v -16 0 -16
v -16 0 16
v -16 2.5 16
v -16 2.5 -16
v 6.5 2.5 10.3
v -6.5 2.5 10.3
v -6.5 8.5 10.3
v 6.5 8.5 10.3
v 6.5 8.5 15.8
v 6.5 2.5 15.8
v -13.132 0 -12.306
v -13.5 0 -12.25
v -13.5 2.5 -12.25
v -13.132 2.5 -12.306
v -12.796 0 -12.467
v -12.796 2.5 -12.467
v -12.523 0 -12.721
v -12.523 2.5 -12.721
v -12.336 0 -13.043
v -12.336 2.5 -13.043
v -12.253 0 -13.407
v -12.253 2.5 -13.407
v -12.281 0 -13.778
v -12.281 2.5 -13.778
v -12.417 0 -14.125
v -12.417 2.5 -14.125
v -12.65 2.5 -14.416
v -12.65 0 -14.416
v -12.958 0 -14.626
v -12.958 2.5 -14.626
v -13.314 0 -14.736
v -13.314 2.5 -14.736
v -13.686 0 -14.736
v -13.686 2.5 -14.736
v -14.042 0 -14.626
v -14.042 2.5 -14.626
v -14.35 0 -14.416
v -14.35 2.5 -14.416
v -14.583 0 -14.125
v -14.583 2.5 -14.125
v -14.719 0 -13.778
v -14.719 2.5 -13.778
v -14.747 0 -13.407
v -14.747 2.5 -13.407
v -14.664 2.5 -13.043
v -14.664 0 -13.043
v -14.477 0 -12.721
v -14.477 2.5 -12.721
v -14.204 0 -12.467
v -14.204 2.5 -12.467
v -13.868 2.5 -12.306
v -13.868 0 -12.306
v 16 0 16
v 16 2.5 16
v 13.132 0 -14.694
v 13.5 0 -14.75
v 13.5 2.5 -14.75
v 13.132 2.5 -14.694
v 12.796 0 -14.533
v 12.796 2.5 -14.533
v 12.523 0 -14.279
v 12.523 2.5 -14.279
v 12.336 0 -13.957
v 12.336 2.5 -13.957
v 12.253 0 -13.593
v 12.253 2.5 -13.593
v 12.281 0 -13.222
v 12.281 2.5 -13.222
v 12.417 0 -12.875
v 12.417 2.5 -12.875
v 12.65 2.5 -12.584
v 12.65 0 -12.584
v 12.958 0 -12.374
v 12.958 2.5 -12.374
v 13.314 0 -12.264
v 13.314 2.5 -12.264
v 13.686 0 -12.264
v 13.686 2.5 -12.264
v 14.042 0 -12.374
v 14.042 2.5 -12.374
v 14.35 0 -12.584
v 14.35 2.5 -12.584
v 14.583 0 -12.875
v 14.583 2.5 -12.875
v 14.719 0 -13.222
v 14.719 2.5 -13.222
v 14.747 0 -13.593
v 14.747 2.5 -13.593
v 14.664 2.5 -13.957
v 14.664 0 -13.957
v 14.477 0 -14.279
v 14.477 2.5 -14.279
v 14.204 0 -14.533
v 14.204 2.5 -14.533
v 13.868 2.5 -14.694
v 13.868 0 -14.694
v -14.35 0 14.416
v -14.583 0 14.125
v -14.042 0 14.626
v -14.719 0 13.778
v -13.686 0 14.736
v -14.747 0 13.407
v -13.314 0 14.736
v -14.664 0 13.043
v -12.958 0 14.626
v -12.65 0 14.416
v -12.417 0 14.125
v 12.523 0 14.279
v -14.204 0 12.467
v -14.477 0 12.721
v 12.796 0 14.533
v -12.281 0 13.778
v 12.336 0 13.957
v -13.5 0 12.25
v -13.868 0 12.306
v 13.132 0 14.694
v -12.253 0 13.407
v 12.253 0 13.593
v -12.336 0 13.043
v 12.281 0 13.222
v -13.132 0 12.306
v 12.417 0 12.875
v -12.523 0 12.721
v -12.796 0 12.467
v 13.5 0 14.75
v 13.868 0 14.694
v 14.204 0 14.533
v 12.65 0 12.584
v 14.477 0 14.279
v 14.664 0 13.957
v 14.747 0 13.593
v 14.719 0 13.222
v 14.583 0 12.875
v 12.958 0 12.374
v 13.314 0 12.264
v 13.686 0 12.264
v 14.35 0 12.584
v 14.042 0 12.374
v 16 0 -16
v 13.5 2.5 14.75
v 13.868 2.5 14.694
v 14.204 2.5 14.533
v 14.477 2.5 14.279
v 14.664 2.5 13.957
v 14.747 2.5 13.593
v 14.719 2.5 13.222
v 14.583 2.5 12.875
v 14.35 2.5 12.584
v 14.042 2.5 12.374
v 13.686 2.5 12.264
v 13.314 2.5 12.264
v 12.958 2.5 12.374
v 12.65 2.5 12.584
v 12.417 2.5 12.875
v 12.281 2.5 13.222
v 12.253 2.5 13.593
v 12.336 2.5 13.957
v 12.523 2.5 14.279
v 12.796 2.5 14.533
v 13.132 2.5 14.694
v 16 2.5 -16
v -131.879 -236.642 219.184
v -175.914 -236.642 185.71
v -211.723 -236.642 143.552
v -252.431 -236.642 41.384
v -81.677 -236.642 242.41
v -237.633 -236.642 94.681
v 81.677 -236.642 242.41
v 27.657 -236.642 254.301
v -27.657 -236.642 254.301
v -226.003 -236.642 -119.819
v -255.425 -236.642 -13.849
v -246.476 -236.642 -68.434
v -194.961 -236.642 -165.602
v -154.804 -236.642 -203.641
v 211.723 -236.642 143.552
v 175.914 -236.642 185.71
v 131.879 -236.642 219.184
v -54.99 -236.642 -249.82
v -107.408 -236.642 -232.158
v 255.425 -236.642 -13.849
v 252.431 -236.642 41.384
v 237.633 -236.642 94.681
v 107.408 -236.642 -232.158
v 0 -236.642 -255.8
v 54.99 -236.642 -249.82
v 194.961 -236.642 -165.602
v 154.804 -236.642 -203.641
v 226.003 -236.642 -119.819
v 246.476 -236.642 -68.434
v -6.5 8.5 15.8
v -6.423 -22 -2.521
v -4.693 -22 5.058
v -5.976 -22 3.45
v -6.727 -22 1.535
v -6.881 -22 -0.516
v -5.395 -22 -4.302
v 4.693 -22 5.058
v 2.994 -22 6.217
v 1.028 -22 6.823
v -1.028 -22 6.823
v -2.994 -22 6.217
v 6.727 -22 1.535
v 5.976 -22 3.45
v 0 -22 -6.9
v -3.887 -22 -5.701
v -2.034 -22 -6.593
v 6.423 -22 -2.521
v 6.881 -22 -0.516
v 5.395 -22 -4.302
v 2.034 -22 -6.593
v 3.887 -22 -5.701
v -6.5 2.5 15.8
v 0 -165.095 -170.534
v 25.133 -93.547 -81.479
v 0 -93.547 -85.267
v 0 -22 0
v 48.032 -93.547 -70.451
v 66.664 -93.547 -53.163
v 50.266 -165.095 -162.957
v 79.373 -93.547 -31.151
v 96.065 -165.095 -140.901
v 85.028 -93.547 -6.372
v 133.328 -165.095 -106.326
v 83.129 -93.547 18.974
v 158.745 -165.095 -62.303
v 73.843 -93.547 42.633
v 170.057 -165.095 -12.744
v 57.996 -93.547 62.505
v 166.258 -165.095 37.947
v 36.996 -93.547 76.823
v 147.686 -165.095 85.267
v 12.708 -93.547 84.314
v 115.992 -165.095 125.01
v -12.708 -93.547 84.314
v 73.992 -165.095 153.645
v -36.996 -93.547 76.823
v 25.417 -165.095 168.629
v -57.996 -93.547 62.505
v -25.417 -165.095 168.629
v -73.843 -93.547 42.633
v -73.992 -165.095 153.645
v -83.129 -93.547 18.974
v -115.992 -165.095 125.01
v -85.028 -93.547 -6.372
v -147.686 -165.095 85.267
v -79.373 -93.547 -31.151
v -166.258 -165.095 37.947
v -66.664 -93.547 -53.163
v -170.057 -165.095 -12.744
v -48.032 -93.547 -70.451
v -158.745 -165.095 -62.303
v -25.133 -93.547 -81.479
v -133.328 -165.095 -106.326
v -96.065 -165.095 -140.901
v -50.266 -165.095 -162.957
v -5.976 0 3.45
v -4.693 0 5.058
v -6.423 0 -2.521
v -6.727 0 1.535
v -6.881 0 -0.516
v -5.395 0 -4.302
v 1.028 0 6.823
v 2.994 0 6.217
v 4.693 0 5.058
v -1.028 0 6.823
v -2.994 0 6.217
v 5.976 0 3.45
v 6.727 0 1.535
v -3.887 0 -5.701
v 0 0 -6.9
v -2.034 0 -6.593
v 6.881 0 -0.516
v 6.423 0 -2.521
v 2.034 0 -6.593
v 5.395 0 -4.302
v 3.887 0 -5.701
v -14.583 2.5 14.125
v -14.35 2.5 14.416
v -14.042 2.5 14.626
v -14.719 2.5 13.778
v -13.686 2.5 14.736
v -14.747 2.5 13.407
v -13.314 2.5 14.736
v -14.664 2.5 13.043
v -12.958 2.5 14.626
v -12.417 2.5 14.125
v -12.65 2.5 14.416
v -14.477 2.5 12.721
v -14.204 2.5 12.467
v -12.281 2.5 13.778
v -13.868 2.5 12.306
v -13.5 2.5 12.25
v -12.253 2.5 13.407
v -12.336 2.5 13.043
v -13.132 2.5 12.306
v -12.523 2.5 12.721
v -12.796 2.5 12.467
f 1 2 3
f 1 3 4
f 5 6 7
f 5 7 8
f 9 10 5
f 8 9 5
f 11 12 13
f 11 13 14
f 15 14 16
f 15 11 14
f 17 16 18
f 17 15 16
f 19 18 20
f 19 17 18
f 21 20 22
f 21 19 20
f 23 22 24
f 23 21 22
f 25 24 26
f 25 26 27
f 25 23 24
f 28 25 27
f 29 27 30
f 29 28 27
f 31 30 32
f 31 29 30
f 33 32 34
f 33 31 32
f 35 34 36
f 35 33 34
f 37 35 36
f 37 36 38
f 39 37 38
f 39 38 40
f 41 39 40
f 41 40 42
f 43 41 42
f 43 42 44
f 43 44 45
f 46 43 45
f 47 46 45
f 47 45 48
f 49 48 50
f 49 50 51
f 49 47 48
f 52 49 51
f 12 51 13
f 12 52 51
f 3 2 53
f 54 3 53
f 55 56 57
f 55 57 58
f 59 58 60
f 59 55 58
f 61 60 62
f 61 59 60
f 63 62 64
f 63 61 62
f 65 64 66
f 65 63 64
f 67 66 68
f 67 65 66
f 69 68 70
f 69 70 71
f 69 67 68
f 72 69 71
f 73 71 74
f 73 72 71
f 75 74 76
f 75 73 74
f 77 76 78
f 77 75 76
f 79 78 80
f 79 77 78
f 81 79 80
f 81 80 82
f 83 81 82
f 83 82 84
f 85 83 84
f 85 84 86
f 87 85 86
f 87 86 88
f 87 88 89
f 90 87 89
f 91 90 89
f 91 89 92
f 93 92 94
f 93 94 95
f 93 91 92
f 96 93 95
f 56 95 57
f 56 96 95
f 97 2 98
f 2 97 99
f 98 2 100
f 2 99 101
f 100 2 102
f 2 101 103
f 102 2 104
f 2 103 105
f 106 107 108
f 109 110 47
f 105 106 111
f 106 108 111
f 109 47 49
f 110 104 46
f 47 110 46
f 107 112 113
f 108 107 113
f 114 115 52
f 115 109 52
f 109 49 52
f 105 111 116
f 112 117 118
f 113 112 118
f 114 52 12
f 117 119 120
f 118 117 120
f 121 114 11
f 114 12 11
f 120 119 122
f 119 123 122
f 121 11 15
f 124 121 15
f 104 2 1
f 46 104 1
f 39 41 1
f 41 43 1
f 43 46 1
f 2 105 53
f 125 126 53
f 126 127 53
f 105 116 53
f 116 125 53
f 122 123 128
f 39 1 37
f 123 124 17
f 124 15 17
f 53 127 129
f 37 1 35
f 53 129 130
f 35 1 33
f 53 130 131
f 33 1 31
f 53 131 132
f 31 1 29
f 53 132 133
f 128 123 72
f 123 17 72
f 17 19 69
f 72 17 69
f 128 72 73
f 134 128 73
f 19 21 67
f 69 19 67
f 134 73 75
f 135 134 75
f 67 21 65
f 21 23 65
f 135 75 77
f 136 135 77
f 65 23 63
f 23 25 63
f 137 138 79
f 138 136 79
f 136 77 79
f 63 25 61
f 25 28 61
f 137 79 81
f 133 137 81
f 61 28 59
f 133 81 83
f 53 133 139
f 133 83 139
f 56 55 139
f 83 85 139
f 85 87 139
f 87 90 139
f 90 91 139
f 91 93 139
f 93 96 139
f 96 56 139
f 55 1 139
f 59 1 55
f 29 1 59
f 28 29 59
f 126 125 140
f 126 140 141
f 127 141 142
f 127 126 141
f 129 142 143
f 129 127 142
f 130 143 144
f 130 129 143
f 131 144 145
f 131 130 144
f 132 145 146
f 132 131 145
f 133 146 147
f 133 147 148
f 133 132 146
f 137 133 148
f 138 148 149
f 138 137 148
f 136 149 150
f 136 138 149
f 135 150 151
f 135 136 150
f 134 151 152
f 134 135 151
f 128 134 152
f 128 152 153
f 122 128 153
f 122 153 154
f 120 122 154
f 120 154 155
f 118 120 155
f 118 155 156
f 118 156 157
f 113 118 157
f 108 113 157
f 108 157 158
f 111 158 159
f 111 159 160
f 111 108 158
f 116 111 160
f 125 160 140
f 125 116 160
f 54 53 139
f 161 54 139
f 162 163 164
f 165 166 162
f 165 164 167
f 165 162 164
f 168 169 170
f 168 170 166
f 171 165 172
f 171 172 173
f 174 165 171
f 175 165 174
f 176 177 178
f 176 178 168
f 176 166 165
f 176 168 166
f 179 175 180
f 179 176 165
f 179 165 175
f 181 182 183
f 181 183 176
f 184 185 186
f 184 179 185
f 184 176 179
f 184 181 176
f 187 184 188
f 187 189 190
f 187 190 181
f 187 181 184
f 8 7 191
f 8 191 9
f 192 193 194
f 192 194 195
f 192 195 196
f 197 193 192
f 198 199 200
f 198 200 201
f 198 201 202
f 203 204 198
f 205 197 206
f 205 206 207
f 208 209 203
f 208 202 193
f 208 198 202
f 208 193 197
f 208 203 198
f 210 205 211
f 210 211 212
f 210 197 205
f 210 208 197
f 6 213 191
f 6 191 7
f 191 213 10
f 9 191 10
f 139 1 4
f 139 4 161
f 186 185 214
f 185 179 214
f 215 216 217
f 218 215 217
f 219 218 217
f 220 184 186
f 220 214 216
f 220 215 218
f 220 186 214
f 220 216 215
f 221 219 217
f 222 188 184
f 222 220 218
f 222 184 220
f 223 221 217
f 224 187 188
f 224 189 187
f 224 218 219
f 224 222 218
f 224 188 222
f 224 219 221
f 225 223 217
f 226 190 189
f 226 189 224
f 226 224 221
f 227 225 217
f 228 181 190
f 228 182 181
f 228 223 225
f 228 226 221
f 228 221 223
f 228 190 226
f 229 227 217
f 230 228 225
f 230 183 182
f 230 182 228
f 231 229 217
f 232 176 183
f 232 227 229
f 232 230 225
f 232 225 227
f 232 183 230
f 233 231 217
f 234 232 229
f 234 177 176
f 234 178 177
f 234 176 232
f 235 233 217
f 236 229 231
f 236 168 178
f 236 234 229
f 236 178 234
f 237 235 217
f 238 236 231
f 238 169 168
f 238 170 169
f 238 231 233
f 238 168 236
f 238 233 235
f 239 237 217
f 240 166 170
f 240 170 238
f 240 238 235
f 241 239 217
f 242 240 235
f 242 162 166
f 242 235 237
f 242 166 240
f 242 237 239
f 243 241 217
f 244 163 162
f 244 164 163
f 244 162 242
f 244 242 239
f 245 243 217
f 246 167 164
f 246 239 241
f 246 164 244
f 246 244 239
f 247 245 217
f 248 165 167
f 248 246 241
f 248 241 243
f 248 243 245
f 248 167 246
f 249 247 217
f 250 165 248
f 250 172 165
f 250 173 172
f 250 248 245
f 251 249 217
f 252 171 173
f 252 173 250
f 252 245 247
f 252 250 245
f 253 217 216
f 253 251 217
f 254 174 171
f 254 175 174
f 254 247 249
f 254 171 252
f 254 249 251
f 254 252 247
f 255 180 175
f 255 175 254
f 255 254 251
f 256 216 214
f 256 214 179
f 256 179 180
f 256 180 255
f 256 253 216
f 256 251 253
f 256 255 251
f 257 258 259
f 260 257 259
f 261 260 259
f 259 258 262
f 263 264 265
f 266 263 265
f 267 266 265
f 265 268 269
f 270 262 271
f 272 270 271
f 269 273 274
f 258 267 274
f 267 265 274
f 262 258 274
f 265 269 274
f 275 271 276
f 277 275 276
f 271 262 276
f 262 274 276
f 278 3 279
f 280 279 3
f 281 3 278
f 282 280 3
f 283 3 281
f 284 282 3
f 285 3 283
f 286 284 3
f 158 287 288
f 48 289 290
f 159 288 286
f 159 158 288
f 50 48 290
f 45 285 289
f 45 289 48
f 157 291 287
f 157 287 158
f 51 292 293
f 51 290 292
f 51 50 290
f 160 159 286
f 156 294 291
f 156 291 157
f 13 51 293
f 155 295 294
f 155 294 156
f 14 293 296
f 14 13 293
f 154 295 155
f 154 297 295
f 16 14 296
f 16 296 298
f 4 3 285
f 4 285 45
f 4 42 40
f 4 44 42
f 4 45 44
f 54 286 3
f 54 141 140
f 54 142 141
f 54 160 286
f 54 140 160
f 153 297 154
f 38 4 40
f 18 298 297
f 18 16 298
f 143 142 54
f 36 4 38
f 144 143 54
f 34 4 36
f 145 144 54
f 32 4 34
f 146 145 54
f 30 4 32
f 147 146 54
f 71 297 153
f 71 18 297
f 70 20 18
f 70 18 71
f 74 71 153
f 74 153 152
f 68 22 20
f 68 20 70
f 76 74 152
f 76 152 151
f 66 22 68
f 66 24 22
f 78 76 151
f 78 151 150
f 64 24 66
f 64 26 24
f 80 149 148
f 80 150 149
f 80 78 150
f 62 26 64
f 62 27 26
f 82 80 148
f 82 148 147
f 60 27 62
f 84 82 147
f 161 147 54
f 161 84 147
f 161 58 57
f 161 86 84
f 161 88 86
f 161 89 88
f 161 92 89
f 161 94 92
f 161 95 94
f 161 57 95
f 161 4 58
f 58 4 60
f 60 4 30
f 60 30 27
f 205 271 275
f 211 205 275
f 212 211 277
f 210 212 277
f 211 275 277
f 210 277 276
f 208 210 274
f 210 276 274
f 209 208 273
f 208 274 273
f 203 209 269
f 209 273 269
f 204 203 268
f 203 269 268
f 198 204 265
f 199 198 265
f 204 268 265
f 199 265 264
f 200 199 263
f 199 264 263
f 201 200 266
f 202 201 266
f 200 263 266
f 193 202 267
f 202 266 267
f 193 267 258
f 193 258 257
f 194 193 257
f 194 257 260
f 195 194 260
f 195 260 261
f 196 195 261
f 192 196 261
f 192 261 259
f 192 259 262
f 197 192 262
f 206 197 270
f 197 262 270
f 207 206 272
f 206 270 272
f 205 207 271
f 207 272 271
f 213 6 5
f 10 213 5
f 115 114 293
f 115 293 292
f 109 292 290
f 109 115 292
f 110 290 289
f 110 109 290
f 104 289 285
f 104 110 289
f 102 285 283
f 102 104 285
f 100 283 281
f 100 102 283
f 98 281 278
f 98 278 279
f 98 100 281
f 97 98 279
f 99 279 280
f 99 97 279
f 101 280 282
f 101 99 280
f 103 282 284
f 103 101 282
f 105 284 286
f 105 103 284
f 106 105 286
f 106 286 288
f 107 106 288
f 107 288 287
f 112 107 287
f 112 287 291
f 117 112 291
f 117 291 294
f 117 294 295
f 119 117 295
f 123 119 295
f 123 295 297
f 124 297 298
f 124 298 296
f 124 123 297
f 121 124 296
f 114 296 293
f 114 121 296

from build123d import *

# Parameters (mm, degrees)
SKETCH_1_W      = 32
SKETCH_1_H      = 32
SKETCH_1_R      = 1.25
EXTRUDE_1_DEPTH = 2.5
SKETCH_2_W      = 13
SKETCH_2_H      = 5.5
EXTRUDE_2_DEPTH = 6
SKETCH_3_R      = 6.9
EXTRUDE_3_DEPTH = 22


with BuildPart() as part:
    # 草图1 → 凸台-拉伸1 (new body)
    with BuildSketch(Plane(origin=(0, 0, 0), x_dir=(1, 0, 0), z_dir=(0, 1, 0))):
        Rectangle(SKETCH_1_W, SKETCH_1_H)
        with Locations(Location((-13.5, 13.5, 0), (0, 0, 270))):
            Circle(SKETCH_1_R, mode=Mode.SUBTRACT)
        with Locations(Location((13.5, 13.5, 0), (0, 0, 90))):
            Circle(SKETCH_1_R, mode=Mode.SUBTRACT)
        with Locations(Location((13.5, -13.5, 0), (0, 0, 270))):
            Circle(SKETCH_1_R, mode=Mode.SUBTRACT)
        with Locations(Location((-13.5, -13.5, 0), (0, 0, 90))):
            Circle(SKETCH_1_R, mode=Mode.SUBTRACT)
    extrude(amount=EXTRUDE_1_DEPTH)


with BuildPart() as body_2:
    # 草图2 → 凸台-拉伸2 (new body)
    with BuildSketch(Plane(origin=(0, 2.5, 0), x_dir=(1, 0, 0), z_dir=(0, 1, 0))):
        with Locations((0, -13.05)):
            Rectangle(SKETCH_2_W, SKETCH_2_H)
    extrude(amount=EXTRUDE_2_DEPTH)


with BuildPart() as body_3:
    # 草图3 → 凸台-拉伸3 (new body)
    with BuildSketch(Plane.XZ):
        with Locations(Location((0, 0, 0), (0, 0, 270))):
            Circle(SKETCH_3_R)
    extrude(amount=EXTRUDE_3_DEPTH)


with BuildPart() as body_4:
    # 草图5 → 旋转1 (revolve)
    with BuildSketch(Plane.XY, mode=Mode.PRIVATE) as revolve_1_sk:
        Polygon((0, -22), (255.800314088, -236.641949206), (0, -236.641949206), align=None)
    revolve(revolve_1_sk.sketch.rotate(Axis((0, 10.025, 0), (0, -1, 0)), 270), axis=Axis((0, 10.025, 0), (0, -1, 0)))


solid = Compound([part.part, body_2.part, body_3.part, body_4.part])
